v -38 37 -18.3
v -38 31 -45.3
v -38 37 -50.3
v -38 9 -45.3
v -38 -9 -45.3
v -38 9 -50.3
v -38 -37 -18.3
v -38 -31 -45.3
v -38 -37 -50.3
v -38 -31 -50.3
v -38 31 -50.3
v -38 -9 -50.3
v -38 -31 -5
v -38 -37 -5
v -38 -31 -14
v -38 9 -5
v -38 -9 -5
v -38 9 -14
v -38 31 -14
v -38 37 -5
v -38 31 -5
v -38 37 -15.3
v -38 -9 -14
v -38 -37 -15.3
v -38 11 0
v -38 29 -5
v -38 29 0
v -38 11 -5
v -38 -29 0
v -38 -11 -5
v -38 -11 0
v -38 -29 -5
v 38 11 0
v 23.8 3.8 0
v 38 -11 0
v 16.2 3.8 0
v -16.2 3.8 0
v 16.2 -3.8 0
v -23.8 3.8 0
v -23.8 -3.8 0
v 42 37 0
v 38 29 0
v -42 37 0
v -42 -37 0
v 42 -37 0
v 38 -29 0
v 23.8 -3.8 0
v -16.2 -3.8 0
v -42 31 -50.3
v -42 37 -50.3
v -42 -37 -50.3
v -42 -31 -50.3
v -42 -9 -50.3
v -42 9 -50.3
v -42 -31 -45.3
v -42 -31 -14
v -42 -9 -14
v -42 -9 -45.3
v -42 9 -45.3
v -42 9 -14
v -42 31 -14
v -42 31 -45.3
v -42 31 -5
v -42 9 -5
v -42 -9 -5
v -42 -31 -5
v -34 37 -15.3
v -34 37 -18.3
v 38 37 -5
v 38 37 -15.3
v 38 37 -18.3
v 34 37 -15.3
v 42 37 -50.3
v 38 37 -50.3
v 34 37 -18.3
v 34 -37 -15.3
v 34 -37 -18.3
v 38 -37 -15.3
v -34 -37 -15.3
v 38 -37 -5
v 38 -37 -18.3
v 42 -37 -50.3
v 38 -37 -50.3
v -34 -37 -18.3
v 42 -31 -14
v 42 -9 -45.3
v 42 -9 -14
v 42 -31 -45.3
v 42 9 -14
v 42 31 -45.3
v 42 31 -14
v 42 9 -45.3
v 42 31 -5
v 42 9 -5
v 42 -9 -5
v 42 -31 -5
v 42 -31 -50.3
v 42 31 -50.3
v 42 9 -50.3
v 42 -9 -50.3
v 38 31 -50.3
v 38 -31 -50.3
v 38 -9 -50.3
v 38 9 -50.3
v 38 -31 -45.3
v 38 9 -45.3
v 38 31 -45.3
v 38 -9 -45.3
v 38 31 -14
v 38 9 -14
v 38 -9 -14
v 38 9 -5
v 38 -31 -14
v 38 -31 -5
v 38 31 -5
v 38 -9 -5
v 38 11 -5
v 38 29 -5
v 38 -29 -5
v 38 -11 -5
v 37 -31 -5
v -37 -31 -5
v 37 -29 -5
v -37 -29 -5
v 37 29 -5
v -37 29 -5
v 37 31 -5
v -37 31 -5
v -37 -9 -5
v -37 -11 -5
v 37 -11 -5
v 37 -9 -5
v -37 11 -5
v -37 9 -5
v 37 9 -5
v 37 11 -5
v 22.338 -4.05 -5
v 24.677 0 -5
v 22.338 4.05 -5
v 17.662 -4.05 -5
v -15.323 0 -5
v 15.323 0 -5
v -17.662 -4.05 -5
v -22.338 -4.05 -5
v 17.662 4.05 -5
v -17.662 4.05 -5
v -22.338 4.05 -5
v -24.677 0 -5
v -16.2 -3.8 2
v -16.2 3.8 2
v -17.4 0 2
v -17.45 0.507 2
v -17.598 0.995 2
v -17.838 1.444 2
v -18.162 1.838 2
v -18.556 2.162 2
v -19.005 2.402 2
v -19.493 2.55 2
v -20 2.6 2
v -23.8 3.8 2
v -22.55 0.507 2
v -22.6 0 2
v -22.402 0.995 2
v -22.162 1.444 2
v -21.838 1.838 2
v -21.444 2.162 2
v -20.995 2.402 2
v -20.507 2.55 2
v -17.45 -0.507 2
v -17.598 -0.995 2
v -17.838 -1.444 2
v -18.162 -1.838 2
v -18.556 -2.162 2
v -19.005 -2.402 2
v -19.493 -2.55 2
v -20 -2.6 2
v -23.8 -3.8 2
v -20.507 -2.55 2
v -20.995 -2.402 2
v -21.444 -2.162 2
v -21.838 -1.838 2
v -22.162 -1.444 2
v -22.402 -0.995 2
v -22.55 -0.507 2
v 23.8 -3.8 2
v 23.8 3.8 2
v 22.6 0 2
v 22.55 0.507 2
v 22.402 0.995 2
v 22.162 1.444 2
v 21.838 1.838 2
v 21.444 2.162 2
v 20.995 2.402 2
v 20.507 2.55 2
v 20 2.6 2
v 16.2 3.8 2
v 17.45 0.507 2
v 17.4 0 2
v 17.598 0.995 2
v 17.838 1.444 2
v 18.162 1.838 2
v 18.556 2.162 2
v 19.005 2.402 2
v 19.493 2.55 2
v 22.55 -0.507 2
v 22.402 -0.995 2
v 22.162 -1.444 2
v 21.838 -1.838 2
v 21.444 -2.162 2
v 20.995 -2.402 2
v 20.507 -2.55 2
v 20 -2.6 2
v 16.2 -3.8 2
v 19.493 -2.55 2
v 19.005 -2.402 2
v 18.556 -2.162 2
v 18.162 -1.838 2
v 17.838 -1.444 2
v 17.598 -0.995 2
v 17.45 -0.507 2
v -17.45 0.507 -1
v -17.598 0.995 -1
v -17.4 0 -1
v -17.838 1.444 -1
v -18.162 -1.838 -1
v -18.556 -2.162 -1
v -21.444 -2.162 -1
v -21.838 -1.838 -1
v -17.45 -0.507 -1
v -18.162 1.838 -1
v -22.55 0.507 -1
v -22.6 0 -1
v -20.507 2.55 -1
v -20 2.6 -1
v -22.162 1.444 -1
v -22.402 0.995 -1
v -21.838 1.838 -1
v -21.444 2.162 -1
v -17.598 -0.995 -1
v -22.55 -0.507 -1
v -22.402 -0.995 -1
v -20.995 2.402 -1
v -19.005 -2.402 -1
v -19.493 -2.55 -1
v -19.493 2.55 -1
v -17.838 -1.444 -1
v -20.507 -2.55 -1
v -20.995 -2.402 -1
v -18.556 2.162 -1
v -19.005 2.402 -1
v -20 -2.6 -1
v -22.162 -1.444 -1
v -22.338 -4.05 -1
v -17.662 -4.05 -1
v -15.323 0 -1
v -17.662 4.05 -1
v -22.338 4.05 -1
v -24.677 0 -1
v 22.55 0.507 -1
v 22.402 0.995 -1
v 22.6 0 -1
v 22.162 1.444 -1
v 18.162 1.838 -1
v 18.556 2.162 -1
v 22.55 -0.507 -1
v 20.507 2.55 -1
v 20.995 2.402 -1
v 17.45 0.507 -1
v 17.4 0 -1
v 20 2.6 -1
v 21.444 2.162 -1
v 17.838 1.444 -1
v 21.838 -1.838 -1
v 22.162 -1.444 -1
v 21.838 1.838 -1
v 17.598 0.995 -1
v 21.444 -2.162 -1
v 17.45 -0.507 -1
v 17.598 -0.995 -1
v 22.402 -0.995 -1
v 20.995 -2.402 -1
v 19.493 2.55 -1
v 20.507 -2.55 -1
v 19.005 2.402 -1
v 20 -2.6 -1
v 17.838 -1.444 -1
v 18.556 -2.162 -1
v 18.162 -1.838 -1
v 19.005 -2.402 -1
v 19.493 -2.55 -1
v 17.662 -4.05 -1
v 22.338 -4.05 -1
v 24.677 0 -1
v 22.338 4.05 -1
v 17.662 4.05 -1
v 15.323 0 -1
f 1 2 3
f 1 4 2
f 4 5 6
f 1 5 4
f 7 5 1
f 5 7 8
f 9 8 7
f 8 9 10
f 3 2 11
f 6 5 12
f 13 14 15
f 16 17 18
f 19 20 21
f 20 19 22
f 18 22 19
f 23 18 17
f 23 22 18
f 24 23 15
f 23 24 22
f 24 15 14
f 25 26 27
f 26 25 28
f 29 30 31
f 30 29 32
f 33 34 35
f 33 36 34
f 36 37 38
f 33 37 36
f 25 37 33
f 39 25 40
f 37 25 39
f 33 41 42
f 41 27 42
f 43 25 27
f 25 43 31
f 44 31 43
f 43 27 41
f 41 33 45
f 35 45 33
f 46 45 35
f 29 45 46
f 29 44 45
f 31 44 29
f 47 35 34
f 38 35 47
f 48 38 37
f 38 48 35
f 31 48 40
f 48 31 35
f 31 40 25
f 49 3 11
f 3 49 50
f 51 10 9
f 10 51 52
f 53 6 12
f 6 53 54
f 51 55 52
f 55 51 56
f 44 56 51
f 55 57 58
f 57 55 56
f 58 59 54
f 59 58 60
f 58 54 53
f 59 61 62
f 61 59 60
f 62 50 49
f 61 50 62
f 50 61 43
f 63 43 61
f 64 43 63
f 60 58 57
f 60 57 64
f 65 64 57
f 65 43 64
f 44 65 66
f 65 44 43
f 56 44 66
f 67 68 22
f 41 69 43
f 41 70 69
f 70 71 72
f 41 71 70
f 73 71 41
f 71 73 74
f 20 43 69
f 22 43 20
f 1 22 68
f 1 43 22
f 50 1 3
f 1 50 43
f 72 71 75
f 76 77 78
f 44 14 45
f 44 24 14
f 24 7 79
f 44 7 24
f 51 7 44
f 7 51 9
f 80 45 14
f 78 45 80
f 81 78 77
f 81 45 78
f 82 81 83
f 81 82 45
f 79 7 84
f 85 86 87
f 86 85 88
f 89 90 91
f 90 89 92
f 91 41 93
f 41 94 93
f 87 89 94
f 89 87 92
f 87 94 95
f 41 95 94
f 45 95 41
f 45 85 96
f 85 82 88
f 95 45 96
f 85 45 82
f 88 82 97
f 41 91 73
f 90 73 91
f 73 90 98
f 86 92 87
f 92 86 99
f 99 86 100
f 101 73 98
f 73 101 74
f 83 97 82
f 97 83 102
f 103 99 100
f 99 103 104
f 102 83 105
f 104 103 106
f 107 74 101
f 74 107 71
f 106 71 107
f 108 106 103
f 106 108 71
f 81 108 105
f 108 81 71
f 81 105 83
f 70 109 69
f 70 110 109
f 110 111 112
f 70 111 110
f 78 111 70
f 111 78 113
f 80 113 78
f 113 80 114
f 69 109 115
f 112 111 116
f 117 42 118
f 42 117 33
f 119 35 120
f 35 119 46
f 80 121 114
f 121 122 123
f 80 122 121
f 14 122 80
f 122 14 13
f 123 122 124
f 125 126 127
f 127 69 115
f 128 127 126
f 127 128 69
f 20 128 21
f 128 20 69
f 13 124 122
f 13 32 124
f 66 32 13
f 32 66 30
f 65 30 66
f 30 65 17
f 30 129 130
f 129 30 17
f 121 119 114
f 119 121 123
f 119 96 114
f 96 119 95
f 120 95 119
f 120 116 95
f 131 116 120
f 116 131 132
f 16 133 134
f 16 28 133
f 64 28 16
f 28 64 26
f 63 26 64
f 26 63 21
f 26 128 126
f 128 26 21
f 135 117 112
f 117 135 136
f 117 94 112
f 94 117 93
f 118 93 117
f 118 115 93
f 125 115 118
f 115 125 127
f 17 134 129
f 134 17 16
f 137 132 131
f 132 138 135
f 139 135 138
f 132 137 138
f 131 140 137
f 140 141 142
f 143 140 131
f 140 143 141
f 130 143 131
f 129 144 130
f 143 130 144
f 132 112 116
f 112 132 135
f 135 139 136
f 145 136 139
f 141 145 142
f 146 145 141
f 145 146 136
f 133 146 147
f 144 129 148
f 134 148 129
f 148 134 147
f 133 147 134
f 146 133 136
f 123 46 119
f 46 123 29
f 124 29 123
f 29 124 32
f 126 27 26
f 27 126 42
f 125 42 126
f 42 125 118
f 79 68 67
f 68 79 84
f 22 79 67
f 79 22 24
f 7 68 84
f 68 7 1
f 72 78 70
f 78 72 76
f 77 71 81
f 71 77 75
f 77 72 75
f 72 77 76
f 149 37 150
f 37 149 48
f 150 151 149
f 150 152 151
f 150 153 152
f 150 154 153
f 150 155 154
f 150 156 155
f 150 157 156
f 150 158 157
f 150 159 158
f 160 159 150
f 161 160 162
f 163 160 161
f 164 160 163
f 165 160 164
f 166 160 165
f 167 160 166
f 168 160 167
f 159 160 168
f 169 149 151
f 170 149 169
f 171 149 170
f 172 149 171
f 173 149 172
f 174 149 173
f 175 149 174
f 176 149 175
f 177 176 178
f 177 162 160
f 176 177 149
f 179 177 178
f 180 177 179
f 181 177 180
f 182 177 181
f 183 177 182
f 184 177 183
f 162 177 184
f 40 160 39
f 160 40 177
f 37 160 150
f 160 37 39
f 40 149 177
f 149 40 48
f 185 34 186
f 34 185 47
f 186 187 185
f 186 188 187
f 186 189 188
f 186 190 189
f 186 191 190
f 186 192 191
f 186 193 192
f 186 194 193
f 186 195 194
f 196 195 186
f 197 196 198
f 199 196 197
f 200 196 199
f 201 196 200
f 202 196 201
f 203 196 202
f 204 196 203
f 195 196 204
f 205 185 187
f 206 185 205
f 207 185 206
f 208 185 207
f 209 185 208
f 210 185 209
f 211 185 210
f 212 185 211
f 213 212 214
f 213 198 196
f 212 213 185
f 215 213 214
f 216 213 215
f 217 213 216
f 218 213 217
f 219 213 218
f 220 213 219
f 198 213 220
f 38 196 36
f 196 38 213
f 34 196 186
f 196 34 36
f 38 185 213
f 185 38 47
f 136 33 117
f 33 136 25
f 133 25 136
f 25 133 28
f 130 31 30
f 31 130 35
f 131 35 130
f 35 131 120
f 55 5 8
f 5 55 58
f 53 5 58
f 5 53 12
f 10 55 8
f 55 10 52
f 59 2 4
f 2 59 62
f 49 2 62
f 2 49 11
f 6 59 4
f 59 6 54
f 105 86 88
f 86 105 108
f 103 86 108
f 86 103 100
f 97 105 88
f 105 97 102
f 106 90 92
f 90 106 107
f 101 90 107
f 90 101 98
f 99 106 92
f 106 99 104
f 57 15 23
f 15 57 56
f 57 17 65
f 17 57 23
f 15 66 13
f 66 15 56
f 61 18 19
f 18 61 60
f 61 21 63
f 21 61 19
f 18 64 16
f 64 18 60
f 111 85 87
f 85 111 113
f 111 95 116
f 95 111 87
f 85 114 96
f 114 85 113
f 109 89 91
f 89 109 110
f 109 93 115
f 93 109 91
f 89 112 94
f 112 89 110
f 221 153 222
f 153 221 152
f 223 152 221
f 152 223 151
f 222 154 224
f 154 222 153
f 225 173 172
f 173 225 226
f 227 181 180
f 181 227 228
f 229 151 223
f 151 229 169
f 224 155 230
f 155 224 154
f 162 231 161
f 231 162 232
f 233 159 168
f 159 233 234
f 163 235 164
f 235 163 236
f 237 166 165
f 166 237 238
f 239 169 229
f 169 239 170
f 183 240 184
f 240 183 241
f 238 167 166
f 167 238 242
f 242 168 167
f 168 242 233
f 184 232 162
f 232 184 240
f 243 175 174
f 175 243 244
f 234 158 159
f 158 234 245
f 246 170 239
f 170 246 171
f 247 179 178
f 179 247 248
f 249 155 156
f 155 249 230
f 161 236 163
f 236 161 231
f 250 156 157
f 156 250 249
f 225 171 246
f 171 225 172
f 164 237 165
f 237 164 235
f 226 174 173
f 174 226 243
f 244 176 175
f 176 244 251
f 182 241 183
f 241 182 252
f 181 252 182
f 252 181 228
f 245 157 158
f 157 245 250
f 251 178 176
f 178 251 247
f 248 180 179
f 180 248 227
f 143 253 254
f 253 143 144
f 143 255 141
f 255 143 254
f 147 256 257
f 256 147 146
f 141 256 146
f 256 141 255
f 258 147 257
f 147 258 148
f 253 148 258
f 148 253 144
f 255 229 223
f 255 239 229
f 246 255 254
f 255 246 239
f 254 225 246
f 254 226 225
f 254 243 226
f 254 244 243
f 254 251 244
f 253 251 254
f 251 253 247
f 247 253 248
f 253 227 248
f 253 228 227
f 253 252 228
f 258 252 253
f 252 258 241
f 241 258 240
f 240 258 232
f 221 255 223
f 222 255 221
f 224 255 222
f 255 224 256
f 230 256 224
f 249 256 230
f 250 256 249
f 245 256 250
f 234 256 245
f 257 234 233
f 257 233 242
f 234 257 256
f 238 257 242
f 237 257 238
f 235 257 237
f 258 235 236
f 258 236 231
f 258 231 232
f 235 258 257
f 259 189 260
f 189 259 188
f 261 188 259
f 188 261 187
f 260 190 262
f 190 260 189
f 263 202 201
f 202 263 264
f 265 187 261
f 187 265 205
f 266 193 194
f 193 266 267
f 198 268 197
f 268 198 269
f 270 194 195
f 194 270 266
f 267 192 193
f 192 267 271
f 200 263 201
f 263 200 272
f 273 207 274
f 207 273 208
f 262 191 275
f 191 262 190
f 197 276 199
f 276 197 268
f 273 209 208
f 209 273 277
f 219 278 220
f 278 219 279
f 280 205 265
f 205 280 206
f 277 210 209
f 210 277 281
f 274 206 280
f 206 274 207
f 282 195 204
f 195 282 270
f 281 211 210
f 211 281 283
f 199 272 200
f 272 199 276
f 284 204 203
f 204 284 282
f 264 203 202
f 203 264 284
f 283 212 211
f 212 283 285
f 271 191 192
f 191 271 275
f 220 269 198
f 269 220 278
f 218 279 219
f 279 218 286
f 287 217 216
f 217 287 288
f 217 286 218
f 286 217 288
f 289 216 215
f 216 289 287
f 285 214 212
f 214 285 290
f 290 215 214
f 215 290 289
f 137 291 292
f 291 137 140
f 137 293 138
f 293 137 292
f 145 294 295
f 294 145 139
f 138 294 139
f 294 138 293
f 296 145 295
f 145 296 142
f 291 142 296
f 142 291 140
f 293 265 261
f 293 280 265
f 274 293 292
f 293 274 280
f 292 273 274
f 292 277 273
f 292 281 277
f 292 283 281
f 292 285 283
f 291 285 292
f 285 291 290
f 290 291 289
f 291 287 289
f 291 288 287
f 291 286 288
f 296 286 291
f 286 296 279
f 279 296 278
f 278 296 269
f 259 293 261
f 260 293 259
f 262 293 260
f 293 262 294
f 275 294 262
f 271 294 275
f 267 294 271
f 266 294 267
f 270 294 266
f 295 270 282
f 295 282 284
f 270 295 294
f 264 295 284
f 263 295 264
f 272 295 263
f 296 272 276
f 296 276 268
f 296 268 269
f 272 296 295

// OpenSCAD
// file: ../params.scad
// ============================================================
// Ham Radio Go Kit — OpenSCAD Parameters
// ============================================================

// ============================================================
// SHELF SLOT — MEASURED (configurable for other shelves)
// ============================================================
slot_width = 8.0;           // mm, slot opening width — MEASURED (long rails)
slot_spacing = 12.0;        // mm, rail width between slots — MEASURED
slot_pitch = slot_width + slot_spacing;  // mm, slot center-to-center (20.0)
shelf_thickness = 1.5;      // mm, shelf material thickness
slot_tab_width = 7.6;       // mm, tab width (0.4mm clearance in an 8mm slot)
slot_tab_depth = 1.0;       // mm, tab depth - just prevents rotation, allows washer clearance
slot_tab_engage = 2.0;      // mm, minimum engagement depth for retention

// ============================================================
// M5 HARDWARE
// ============================================================
m5_screw_d = 5.2;           // mm, clearance hole diameter
m5_nut_w = 8.0;             // mm, hex nut width across flats
m5_nut_h = 4.0;             // mm, hex nut height
m5_washer_od = 10.0;        // mm, washer OD - verify clears slot

// ============================================================
// TOLERANCES
// ============================================================
fit_clearance = 0.2;        // mm, slot tab fit clearance
nut_pocket_tol = 0.1;       // mm, nut pocket oversize for capture (reduced to prevent rotation)

// ============================================================
// VELCRO STRAP MOUNTS
// ============================================================
velcro_width = 19.05;       // mm, 0.75" velcro - standardize all straps
velcro_channel_clearance = 1.0;  // mm, channel oversize
mount_body_w = 25.0;        // mm
mount_body_d = 25.0;        // mm
mount_body_h = 8.0;         // mm, sets max gear height that can be strapped

// ============================================================
// PINEBOOK PRO — measure closed unit with calipers
// ============================================================
pbp_w = 280.0;              // mm, width
pbp_d = 192.0;              // mm, depth
pbp_h = 12.0;               // mm, closed lid thickness — MEASURE
pbp_clearance = 0.5;        // mm, fit clearance inside captures

// L-mount (front, x2)
l_arm_thickness = 4.0;      // mm, horizontal arm thickness
l_arm_length = 15.0;        // mm, how far arm extends over laptop top

// Corner mount (rear, x2)
corner_wall_thickness = 4.0;  // mm
corner_wall_h = 20.0;         // mm, should be > pbp_h + corner_arm_thickness
corner_arm_length = 15.0;     // mm, top retention arm extends over laptop
corner_arm_thickness = 4.0;   // mm

// ============================================================
// ANTUNER AT-100M PRO — MEASURED
// ============================================================
antuner_w = 74.0;           // mm, width (front panel with screen/power/tune)
antuner_h = 29.0;           // mm, height (front panel)
antuner_d = 154.0;          // mm, front-to-back case depth
antuner_ctrl_top = 6.0;     // mm, screen/tune buttons offset down from top edge
antuner_fit = 1.0;          // mm, clearance between tuner side and cradle wall

// ============================================================
// SHELF FRONT LIP
// ============================================================
shelf_lip_h = 15.3;         // mm, front lip height that blocks the controls — MEASURED

// ============================================================
// ANTUNER HANGING SPACER (mounts to shelf slots, tuner hangs below lip)
// ============================================================
antuner_drop = shelf_lip_h + 3.0;      // mm, tuner top below shelf underside (clears lip)
antuner_wall = 4.0;                    // mm, cradle wall thickness
antuner_plate_t = 5.0;                 // mm, top frame thickness (4mm nut pocket + 1mm skin)
antuner_cradle_len = 74.0;             // mm, cradle band along the tuner (sits mid-tuner)
antuner_foot = 3.0;                    // mm, wall extension below tuner bottom
antuner_channel_h = 6.0;               // mm, upper strap window height
antuner_channel_w = 22.0;              // mm, strap slot / window width
antuner_strap_y = 20.0;                // mm, strap positions each side of cradle center
antuner_ledge = 4.0;                   // mm, register ledge the tuner top rests against
antuner_ledge_t = 3.0;                 // mm, register ledge thickness
antuner_bar_h = 11.0;                  // mm, half-depth of the central tab bar (Y)
antuner_rail_w = 8.0;                  // mm, front/back frame rail width (Y)
antuner_window_h = 9.0;                // mm, upper strap window height (Z)
antuner_tab_h = shelf_thickness + 0.5; // mm, slot tab height (up into the slot)
antuner_tab_x = 20.0;                  // mm, tab offset X, directly above the tuner; must land on a rail — MEASURE

// ============================================================
// MFJ-939 BRACKETS — measure on physical unit
// ============================================================
mfj939_chassis_w = 0.0;        // mm, outside width — MEASURE
mfj939_side_screw_d = 3.5;     // mm, #6-32 clearance hole — VERIFY
mfj939_side_screw_spacing = 0.0; // mm, fore/aft spacing between screw holes on side panel — MEASURE
mfj939_screw_height = 0.0;     // mm, screw centerline height above shelf surface — MEASURE

// Bracket geometry
bracket_foot_d = 25.0;         // mm, horizontal foot depth on shelf
bracket_foot_h = 8.0;          // mm, horizontal foot thickness
bracket_arm_thickness = 4.0;   // mm, vertical arm thickness
// main file
// ============================================================
// AnTuner AT-100M Pro — Hanging Spacer
// ============================================================
// Replaces the SWR meter that used to fill the 1U front gap on the
// inverted upper shelf. The AT-100M Pro is short, so mounted in the
// gap its screen/power/tune buttons sit behind the shelf front lip
// (shelf_lip_h). This spacer bolts to the shelf slots from BELOW and
// drops the tuner below the lip; the front panel faces the user,
// level, clearing the lip by (antuner_drop + antuner_ctrl_top -
// shelf_lip_h).
//
// Lean frame layout:
//   - top frame: two side walls + a central tab bar + front/back rails
//     (open windows between them) with the slot tabs above the tuner
//   - register ledges on the walls set the tuner top at antuner_drop
//   - full velcro loop: under the tuner -> out through a lower wall slot
//     -> up OUTSIDE the wall -> back in through an upper wall window
//     -> across the top (above the tuner) -> out the other side and round.
//     The strap never touches the tuner top.
//
// Slot mounts sit directly above the tuner (antuner_tab_x); shelf slots
// are long rails so only the tab X spacing must match the rail pitch.
//
// Hardware: 2x M5x10-12 screws + 10mm washers from above, 2x M5 hex
// nuts pressed up into the pockets from below (1mm skin left on top).
//
// Print plate-down (walls up): print_orientation = true;
// ============================================================

include <../params.scad>

show_tuner = true;          // ghost tuner for fit checking (preview only)
print_orientation = false;  // true = frame down / walls up for printing

// ---------------- derived geometry ----------------
arm_inner  = antuner_w / 2 + antuner_fit;   // wall inner face
arm_outer  = arm_inner + antuner_wall;      // wall outer face
cradle     = antuner_cradle_len;
y_back     = -cradle / 2;
tuner_bot  = -(antuner_drop + antuner_h);
wall_bot   = tuner_bot - antuner_foot;

nut_d      = (m5_nut_w + nut_pocket_tol) / cos(30);  // hex pocket across-corners

module antuner_spacer() {
    difference() {
        union() {
            // Side walls
            for (sx = [-1, 1])
                translate([sx > 0 ? arm_inner : -arm_outer, y_back, wall_bot])
                    cube([antuner_wall, cradle, -wall_bot]);

            // Central tab bar (holds the two slot tabs above the tuner)
            translate([-arm_outer, -antuner_bar_h, -antuner_plate_t])
                cube([2 * arm_outer, 2 * antuner_bar_h, antuner_plate_t]);

            // Front / back frame rails (brace the walls)
            for (sy = [-1, 1])
                translate([-arm_outer, sy * cradle / 2 - (sy > 0 ? antuner_rail_w : 0), -antuner_plate_t])
                    cube([2 * arm_outer, antuner_rail_w, antuner_plate_t]);

            // Register ledges — tuner top rests against these at z = -antuner_drop
            for (sx = [-1, 1])
                translate([sx > 0 ? arm_inner - antuner_ledge : -arm_inner, y_back, -antuner_drop])
                    cube([antuner_ledge, cradle, antuner_ledge_t]);

            // Slot tabs, directly above the tuner
            for (sx = [-1, 1])
                translate([sx * antuner_tab_x - slot_tab_width / 2, -slot_tab_width / 2, 0])
                    cube([slot_tab_width, slot_tab_width, antuner_tab_h]);
        }

        // Lower strap slots — open at the bottom edge (no wasted material below)
        for (sx = [-1, 1], sy = [-1, 1])
            translate([
                sx > 0 ? arm_inner - 1 : -arm_outer - 1,
                sy * antuner_strap_y - antuner_channel_w / 2,
                wall_bot - 1
            ])
                cube([antuner_wall + 2, antuner_channel_w, (tuner_bot + 2) - wall_bot + 1]);

        // Upper strap windows through the walls (above the tuner)
        for (sx = [-1, 1], sy = [-1, 1])
            translate([
                sx > 0 ? arm_inner - 1 : -arm_outer - 1,
                sy * antuner_strap_y - antuner_channel_w / 2,
                -antuner_plate_t - antuner_window_h
            ])
                cube([antuner_wall + 2, antuner_channel_w, antuner_window_h]);

        // Slot-tab hardware — M5 from above, nut pressed up from below
        for (sx = [-1, 1]) {
            tx = sx * antuner_tab_x;
            translate([tx, 0, -antuner_plate_t - 1])
                cylinder(h = antuner_plate_t + antuner_tab_h + 2, d = m5_screw_d, $fn = 32);
            translate([tx, 0, -antuner_plate_t])
                cylinder(h = m5_nut_h, d = nut_d, $fn = 6);
        }
    }
}

// Transparent ghost of the tuner, for fit checking in preview only
module antuner_reference() {
    % translate([-antuner_w / 2, -antuner_d / 2, tuner_bot])
        cube([antuner_w, antuner_d, antuner_h]);
}

if (print_orientation)
    rotate([180, 0, 0]) antuner_spacer();
else
    antuner_spacer();

if (show_tuner)
    antuner_reference();
